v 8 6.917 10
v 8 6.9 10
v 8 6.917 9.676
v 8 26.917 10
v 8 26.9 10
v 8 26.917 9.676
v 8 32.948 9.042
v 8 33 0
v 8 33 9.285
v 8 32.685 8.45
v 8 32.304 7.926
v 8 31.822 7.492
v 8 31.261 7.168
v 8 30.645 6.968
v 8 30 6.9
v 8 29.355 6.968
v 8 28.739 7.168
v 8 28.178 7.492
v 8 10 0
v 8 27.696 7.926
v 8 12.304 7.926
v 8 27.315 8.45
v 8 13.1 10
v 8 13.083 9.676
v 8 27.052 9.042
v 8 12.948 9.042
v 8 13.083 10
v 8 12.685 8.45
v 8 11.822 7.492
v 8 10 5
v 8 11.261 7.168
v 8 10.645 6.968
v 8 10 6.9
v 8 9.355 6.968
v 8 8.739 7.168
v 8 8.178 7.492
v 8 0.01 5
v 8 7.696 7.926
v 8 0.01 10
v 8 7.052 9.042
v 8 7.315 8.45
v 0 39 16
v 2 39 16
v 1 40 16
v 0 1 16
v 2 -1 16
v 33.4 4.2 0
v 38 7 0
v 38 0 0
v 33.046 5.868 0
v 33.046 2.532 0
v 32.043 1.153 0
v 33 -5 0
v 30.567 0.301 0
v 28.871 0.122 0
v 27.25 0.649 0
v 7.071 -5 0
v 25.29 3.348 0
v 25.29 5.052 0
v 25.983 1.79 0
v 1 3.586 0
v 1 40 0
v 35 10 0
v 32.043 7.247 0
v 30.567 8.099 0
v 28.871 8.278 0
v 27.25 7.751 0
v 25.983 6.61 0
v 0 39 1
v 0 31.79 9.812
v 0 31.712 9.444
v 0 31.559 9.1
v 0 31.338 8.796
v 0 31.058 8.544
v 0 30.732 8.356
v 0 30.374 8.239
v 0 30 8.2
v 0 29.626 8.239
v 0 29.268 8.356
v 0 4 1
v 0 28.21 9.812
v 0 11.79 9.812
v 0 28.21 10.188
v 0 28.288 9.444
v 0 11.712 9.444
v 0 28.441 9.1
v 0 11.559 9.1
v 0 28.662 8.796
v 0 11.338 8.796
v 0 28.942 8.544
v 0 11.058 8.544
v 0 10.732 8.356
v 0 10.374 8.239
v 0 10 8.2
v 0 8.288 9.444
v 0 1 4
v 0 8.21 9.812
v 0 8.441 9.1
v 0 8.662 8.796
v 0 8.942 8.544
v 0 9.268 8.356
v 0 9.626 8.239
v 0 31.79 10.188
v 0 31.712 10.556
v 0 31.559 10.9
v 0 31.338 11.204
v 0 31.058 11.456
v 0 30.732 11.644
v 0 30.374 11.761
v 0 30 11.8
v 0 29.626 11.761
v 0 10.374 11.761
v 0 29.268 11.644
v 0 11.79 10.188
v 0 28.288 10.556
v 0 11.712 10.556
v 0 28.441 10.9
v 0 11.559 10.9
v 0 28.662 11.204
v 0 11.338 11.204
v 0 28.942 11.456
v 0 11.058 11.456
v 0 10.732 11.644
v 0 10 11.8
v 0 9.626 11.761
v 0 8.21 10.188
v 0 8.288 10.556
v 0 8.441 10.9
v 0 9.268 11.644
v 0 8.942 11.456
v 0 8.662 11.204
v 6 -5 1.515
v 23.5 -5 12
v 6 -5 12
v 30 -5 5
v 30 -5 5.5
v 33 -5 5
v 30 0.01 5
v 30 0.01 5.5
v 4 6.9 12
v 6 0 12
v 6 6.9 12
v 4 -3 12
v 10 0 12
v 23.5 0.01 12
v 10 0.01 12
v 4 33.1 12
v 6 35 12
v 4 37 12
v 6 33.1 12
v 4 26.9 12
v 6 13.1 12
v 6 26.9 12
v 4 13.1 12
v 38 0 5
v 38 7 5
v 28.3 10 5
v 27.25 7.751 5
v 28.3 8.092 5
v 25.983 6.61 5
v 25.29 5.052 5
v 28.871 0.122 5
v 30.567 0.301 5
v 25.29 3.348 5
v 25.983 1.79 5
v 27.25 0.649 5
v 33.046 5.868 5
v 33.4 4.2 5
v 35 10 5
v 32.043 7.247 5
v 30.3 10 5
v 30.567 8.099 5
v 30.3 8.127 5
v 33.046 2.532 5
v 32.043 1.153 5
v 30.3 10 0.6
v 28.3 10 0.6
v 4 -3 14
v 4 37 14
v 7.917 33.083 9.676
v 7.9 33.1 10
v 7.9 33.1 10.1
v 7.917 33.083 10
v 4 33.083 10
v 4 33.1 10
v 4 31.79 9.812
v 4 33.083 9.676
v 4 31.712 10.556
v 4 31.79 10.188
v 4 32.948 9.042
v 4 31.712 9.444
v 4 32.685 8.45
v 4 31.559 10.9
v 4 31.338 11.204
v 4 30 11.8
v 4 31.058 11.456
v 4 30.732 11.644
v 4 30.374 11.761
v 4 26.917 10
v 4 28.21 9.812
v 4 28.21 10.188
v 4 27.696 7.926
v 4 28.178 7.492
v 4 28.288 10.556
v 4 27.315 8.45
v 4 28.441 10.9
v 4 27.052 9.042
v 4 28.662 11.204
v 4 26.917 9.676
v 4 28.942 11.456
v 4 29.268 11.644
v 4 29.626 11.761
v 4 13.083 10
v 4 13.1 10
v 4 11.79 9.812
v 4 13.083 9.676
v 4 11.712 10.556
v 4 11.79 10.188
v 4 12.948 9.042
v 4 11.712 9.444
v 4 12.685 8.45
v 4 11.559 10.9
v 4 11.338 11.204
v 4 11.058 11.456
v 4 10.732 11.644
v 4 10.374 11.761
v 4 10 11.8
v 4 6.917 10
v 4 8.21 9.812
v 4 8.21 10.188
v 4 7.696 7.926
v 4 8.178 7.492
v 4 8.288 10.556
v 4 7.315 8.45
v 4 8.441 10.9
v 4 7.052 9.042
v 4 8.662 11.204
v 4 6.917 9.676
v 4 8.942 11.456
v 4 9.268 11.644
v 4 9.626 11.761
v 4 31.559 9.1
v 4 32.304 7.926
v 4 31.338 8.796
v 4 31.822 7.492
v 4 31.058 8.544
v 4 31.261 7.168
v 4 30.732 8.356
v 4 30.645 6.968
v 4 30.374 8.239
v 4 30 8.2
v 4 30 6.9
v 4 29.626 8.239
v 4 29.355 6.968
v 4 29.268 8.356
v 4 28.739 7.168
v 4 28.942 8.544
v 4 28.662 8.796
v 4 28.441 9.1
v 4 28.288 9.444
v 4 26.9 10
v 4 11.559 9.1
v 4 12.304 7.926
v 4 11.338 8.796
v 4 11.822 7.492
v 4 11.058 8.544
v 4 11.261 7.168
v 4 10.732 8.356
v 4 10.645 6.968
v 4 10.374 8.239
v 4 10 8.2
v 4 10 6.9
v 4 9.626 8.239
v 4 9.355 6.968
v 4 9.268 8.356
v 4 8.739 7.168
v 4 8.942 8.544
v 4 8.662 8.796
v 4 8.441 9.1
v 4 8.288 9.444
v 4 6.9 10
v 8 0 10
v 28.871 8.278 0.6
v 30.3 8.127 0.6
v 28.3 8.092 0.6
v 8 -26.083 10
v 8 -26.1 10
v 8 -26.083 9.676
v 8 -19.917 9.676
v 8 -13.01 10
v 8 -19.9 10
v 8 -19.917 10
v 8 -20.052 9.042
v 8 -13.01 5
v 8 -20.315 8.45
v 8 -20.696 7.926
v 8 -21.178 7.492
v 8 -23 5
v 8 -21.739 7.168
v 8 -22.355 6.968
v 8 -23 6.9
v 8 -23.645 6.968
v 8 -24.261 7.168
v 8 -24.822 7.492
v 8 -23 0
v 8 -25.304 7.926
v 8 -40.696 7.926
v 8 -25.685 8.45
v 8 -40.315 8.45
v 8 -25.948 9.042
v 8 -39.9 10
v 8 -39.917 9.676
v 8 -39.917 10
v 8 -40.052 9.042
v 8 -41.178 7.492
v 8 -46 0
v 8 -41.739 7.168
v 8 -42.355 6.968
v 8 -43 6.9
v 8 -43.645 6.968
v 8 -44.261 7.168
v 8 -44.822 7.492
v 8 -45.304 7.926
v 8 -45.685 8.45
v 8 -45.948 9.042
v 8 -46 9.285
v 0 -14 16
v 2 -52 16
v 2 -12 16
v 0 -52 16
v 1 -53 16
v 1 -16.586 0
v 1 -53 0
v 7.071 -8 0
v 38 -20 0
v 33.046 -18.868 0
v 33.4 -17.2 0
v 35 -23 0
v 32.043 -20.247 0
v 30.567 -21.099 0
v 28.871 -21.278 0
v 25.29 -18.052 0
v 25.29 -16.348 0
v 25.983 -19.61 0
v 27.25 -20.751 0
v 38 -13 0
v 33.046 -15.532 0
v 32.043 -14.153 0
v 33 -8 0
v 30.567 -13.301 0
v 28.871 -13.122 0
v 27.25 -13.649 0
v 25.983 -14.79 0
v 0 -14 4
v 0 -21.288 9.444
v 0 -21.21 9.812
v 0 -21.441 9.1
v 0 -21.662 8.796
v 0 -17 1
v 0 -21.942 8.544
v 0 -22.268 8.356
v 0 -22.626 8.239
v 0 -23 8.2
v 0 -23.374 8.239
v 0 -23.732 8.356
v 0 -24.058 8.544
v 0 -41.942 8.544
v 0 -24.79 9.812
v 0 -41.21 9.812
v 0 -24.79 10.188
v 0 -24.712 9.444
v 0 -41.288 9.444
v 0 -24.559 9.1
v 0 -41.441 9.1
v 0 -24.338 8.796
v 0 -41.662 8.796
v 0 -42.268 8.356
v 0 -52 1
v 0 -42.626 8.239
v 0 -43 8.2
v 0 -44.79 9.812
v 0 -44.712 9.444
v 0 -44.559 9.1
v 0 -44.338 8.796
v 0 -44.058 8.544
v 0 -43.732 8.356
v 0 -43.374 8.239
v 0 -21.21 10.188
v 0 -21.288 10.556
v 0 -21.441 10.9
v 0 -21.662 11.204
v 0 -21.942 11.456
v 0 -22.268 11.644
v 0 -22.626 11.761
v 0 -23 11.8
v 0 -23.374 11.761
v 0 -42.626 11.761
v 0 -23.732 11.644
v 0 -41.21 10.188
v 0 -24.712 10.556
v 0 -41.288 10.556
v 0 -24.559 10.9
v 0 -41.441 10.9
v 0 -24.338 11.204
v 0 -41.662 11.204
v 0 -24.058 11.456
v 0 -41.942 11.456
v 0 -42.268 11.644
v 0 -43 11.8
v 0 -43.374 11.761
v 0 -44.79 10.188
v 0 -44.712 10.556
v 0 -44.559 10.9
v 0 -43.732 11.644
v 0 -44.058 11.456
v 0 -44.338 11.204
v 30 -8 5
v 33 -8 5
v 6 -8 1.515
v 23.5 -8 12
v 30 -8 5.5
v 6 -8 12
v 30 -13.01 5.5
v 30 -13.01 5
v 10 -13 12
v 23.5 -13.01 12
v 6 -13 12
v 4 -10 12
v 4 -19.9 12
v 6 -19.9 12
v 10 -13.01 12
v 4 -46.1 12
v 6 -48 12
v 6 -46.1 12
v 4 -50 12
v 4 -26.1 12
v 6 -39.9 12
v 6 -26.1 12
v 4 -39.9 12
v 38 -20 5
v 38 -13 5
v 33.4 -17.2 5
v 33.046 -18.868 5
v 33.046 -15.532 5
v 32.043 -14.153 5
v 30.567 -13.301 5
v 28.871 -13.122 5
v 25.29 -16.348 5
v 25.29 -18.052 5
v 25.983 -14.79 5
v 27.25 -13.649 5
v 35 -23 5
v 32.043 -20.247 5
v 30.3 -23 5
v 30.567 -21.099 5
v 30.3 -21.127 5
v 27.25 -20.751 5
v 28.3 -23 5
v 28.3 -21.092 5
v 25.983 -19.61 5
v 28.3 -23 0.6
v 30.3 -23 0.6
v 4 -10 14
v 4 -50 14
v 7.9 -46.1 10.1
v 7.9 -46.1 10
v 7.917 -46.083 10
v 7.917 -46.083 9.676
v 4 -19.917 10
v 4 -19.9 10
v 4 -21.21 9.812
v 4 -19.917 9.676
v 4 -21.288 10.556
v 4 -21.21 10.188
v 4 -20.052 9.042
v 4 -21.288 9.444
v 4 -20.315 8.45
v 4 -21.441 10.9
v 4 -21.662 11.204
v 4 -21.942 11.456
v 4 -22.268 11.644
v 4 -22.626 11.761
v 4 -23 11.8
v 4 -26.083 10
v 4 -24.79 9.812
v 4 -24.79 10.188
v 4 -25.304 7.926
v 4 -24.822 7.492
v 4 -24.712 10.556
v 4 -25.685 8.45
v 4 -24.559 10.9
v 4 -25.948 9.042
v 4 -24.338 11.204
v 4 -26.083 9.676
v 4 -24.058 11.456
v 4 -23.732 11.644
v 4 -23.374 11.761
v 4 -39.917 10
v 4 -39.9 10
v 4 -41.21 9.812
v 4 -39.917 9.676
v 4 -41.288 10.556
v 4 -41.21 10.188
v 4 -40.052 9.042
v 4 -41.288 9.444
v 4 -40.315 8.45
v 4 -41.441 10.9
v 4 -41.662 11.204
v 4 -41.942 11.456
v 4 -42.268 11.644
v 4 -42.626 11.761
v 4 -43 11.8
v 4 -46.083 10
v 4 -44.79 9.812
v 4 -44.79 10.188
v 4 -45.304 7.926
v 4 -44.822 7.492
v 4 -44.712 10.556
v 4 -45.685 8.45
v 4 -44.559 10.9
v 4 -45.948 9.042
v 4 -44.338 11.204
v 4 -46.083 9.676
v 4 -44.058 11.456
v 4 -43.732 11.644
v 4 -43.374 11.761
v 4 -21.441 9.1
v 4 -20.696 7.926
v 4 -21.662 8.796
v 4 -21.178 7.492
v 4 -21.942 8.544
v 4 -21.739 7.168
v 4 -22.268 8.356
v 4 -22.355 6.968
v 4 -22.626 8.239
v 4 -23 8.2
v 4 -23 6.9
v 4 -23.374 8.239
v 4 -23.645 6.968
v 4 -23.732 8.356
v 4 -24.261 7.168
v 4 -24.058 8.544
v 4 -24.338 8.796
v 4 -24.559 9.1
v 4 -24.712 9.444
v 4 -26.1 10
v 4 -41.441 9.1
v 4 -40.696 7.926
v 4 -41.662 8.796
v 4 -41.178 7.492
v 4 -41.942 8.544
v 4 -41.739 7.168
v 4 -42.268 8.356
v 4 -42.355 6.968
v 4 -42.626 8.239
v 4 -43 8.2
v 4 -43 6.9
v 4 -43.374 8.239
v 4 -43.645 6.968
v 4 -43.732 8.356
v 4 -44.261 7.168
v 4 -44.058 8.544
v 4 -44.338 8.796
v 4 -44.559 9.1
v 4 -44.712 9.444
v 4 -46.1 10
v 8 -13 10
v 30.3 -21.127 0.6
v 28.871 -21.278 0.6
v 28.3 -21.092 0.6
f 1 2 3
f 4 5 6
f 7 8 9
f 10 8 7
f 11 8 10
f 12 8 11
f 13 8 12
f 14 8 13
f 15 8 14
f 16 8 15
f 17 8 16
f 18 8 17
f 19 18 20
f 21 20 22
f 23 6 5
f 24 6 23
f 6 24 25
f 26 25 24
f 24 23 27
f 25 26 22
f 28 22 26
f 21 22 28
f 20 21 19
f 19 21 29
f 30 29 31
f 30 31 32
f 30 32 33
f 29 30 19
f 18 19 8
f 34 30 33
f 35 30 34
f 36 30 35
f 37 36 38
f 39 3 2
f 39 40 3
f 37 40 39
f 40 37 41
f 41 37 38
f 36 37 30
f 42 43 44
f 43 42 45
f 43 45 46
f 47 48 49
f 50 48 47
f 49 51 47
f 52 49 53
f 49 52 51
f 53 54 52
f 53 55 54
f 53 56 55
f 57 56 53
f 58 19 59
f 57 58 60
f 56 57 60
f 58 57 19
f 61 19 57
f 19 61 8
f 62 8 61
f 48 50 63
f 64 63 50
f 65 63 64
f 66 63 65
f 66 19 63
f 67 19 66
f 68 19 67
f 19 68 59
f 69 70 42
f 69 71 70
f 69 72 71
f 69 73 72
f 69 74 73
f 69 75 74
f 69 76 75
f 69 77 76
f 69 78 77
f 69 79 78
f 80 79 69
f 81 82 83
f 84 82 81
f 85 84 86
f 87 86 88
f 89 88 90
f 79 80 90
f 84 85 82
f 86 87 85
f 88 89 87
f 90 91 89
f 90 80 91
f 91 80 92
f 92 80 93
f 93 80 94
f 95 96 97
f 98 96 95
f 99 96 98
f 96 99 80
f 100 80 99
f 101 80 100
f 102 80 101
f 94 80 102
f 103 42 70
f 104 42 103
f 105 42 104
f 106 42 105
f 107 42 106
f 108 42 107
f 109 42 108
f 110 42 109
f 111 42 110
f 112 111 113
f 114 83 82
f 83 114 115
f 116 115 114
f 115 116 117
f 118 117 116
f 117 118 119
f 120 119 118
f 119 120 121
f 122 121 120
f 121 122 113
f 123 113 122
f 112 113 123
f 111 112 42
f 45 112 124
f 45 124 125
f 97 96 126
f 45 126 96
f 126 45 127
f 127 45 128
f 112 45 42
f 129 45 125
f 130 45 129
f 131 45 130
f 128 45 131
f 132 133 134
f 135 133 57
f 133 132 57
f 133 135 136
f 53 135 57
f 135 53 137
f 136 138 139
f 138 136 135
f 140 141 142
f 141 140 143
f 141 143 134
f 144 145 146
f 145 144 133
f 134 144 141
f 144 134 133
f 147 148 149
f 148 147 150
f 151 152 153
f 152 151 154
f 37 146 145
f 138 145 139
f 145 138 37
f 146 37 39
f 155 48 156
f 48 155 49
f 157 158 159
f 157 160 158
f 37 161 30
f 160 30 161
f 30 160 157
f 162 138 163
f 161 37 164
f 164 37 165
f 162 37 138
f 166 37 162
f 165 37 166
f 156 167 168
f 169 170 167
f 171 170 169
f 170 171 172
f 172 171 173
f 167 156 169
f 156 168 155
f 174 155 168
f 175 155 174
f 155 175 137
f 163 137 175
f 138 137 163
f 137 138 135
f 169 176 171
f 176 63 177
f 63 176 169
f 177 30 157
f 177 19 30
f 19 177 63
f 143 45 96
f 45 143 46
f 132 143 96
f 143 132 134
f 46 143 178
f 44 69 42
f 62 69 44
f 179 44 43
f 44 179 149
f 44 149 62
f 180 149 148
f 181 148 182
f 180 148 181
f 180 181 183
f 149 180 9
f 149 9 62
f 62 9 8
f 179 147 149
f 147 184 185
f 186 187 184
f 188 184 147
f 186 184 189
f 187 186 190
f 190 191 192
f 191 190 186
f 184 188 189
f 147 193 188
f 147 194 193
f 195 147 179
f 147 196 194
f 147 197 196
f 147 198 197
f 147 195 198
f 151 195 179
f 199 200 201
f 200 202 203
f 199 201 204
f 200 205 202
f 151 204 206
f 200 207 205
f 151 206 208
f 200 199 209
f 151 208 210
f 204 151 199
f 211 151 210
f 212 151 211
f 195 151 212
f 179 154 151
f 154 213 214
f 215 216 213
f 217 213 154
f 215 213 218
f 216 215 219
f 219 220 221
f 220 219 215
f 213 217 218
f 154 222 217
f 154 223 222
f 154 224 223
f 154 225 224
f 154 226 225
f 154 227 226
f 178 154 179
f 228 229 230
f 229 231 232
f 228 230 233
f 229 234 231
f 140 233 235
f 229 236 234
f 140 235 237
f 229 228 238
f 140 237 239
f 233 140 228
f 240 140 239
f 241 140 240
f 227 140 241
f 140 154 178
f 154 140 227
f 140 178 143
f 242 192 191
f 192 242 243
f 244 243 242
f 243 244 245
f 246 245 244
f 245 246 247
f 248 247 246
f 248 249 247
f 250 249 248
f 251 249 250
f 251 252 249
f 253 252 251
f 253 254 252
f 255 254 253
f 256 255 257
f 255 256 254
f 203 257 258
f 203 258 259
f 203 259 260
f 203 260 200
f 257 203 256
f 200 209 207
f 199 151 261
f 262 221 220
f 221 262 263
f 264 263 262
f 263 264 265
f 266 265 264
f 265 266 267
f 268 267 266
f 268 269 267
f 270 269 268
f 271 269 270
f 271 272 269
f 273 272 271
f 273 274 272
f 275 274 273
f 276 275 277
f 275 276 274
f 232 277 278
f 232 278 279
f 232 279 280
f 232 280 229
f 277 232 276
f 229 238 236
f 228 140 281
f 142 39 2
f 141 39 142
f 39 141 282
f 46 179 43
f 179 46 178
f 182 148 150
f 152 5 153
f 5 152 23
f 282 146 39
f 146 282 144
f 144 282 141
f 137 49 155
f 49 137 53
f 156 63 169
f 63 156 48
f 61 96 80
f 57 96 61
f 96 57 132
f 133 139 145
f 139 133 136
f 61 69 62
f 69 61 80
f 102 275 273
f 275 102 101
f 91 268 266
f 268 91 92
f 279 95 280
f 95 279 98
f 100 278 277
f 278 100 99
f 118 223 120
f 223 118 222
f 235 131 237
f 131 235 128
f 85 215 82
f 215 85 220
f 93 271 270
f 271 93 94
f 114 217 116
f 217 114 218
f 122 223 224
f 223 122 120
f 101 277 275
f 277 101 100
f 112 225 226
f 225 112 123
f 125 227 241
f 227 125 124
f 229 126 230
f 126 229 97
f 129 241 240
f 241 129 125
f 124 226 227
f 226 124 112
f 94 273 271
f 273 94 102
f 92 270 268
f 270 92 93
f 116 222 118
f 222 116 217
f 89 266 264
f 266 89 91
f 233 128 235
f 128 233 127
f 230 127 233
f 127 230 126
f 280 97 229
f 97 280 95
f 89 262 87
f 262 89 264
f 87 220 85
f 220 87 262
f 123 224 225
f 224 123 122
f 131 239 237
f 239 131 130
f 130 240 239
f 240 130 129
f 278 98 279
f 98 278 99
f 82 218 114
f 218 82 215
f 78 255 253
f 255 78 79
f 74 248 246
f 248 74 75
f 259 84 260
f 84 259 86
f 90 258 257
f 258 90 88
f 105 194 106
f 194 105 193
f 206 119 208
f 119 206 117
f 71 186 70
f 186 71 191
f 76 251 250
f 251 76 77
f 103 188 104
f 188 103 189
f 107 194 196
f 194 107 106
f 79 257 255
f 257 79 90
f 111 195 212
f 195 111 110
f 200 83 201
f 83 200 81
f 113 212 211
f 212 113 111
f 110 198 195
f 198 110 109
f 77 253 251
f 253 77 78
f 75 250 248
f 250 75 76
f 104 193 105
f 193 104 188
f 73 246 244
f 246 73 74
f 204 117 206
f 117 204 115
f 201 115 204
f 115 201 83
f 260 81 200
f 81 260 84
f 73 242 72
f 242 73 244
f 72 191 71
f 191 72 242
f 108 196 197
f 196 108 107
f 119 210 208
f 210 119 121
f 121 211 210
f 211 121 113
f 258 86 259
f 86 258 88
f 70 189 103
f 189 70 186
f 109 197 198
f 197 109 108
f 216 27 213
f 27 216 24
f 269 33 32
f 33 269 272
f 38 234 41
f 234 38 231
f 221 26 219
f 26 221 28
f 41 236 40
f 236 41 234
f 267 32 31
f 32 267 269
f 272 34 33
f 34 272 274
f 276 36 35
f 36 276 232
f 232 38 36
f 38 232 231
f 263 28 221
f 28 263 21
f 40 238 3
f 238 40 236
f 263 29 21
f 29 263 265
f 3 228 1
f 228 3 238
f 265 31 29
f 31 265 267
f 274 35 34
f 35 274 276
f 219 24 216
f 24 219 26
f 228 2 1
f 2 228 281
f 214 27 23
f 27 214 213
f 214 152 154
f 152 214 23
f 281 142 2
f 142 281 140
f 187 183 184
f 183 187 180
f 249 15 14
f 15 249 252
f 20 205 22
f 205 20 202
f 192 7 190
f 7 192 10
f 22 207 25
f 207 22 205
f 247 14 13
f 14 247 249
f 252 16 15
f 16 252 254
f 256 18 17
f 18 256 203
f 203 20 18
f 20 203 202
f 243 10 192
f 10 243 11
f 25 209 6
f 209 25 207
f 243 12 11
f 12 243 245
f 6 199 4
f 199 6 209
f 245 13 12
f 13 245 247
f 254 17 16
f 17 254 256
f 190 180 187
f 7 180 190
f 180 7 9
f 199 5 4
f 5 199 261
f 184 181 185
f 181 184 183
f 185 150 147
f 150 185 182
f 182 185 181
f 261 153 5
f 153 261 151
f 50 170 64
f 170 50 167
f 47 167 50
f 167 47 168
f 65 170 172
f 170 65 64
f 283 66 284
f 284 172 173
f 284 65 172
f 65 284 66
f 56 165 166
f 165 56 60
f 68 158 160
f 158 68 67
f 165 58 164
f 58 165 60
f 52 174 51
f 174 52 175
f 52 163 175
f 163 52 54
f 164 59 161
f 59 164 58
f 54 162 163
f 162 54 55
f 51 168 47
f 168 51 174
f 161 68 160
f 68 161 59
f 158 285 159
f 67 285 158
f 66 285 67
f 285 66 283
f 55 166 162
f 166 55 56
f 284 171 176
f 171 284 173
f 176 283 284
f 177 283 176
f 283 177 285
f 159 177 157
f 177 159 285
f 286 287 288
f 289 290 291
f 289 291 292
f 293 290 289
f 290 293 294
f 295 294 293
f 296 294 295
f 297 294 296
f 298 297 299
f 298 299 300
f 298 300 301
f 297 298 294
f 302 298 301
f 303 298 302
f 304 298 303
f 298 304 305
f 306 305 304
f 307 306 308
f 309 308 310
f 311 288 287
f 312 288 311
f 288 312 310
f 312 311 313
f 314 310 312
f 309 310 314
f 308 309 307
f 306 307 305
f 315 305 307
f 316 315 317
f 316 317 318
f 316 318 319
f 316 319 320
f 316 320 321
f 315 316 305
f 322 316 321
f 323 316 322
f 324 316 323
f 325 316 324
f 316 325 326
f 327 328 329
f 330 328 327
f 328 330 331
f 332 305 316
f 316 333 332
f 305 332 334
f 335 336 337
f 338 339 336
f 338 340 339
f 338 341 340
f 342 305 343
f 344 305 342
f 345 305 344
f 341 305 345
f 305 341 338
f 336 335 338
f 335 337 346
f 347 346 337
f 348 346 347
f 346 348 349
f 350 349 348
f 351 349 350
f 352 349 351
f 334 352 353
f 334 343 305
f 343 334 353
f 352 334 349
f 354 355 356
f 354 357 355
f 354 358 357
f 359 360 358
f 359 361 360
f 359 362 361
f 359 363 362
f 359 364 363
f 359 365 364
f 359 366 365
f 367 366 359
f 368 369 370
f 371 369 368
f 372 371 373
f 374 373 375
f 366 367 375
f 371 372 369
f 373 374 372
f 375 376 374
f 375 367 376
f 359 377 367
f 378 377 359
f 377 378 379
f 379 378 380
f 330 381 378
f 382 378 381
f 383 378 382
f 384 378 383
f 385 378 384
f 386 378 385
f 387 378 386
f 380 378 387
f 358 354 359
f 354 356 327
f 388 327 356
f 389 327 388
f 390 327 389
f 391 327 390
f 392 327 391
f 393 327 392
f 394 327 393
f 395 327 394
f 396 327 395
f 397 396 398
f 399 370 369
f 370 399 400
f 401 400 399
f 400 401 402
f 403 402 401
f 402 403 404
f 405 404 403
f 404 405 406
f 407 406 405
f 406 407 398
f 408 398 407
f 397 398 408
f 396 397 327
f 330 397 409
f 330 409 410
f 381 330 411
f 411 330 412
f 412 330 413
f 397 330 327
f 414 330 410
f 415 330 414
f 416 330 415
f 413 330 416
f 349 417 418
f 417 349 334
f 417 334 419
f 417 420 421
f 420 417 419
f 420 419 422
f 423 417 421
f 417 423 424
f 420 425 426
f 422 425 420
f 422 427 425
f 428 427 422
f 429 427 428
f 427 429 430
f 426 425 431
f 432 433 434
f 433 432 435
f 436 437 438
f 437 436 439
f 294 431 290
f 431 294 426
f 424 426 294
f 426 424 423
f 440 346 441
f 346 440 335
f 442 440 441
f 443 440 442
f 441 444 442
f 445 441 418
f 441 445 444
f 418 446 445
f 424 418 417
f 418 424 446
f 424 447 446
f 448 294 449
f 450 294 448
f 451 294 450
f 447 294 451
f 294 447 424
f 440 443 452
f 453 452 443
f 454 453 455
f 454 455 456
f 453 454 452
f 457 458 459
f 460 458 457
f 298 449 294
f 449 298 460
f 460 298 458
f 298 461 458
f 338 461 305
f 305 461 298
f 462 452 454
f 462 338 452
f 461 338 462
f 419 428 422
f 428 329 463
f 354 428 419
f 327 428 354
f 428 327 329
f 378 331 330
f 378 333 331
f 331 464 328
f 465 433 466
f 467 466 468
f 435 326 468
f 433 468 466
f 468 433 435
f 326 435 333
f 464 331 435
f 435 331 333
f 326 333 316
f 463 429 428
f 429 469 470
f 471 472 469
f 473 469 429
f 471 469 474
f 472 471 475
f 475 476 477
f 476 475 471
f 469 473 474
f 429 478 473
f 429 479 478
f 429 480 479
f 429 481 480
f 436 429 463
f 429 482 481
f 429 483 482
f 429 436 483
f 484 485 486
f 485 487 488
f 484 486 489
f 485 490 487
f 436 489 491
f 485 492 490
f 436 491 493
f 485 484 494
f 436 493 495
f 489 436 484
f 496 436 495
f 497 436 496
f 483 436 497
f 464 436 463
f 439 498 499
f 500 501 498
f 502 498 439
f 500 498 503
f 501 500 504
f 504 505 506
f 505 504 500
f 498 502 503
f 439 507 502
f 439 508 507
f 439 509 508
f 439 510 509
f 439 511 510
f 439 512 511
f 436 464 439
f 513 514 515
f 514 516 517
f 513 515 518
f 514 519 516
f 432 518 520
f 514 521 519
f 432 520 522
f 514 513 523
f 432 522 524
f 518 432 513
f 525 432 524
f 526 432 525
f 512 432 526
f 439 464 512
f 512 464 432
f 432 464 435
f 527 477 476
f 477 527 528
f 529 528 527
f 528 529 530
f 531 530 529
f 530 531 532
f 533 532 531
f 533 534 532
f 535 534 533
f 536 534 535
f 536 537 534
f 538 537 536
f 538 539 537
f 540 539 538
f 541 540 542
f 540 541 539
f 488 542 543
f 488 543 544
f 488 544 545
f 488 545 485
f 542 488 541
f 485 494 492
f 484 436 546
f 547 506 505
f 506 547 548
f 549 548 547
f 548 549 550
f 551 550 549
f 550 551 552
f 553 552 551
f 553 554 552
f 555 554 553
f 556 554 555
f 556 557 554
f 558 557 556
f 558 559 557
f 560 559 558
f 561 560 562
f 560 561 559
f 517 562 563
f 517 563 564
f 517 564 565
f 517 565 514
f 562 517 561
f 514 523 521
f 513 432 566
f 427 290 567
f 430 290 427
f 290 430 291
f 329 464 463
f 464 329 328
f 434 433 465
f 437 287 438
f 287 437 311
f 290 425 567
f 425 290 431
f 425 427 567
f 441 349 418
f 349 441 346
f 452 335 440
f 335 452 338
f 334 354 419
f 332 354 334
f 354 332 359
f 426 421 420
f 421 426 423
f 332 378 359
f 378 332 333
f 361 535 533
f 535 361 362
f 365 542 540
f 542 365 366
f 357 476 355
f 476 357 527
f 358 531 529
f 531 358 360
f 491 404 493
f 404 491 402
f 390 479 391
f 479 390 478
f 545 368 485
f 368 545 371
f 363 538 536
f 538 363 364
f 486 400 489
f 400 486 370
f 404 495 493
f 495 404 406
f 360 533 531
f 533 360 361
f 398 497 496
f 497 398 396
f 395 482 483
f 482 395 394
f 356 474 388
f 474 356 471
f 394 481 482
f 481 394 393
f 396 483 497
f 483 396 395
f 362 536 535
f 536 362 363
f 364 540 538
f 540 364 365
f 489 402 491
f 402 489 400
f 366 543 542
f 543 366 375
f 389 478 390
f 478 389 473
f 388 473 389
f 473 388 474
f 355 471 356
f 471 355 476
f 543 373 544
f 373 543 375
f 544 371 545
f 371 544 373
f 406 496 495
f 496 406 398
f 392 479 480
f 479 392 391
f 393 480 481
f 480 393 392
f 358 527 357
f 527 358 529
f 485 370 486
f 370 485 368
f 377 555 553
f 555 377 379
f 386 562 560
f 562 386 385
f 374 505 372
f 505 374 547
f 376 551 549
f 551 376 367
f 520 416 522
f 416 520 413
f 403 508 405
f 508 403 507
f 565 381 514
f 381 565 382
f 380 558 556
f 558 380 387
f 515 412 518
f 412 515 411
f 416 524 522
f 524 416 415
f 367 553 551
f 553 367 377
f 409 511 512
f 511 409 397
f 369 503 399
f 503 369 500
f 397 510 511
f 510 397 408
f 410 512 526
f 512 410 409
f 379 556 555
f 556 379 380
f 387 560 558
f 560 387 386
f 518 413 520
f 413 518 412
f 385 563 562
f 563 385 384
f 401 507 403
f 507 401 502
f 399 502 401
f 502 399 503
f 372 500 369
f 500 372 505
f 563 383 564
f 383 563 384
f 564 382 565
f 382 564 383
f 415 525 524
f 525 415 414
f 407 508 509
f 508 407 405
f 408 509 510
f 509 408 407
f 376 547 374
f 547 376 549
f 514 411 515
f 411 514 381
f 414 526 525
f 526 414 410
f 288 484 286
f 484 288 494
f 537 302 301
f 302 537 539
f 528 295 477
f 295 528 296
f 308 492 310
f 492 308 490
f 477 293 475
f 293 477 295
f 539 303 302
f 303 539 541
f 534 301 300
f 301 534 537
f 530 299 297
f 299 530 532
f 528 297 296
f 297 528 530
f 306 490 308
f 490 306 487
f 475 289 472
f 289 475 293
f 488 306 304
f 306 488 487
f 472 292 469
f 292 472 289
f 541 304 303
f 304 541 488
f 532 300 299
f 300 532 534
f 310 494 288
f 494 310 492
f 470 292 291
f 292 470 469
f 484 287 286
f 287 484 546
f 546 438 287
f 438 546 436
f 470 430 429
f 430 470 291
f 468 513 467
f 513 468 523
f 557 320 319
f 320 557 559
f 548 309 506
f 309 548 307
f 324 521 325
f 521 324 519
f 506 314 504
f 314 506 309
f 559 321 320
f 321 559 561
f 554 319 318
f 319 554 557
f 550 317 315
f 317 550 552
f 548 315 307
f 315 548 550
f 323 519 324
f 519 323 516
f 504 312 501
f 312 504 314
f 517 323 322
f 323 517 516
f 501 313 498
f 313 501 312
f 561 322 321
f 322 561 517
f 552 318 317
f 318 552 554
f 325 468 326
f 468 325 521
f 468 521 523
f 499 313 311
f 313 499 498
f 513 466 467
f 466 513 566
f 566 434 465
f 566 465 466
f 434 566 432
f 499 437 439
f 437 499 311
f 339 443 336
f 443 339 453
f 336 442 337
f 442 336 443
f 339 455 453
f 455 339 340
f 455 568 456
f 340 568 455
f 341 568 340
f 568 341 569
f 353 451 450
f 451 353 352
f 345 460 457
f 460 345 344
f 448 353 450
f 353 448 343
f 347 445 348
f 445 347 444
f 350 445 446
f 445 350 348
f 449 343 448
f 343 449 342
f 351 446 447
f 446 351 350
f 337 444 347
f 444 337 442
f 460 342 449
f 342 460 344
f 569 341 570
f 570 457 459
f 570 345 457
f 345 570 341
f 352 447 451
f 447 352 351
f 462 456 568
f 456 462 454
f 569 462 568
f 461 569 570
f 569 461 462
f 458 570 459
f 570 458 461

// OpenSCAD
// PRUSA iteration3
// Z axis top holder
// GNU GPL v3
// Josef Průša <iam@josefprusa.cz> and contributors
// http://www.reprap.org/wiki/Prusa_Mendel
// http://prusamendel.org

module z_top_base(){
 translate([0,-5,0]) cube([8,45,16]); // plate touching the base
 translate([0,-5,0]) cube([30,5.01,12]); // plate touching the base
 translate([0,-5,0]) cube([38,15,5]); // plate touching the base
}

module z_top_fancy(){
 // Corner cutouts
 translate([0.5,0.5,0]) rotate([0,0,-45-180]) translate([-15,0,-1]) cube([30,30,51]);
 translate([0.5,40-0.5,0]) rotate([0,0,-45+90]) translate([-15,0,-1]) cube([30,30,51]);
 translate([-4,40+5,0]) rotate([0,0,-45-0]) translate([0,0,-1]) cube([30,30,51]);
 
    translate([4,0,12]) rotate([0,0, 0]) translate([0,-5,0]) cube([30,50,30]);
    
    translate([6,0,12]) rotate([0,-45, 0]) translate([0,-5,0]) cube([30,50,30]);
    
    translate([8,5,10]) rotate([0,-45, 0]) translate([0,-5,0]) cube([30,50,30]);
 
 translate([38-2.5,-5+2.5,0]) rotate([0,0,-45-90]) translate([-15,0,-1]) cube([30,30,51]);
 translate([38-1.5,10-1.5,0]) rotate([0,0,-45]) translate([-15,0,-1]) cube([30,30,51]);
 translate([0,0,5]) rotate([45+180,0,0]) rotate([0,0,-45+90]) translate([0,0,-15]) cube([30,30,30]);

// Stiffner cut out
 translate([30,0,5.5]) rotate([0,-45,0]) translate([0,-5,0]) cube([30,50,30]);
 //easy cleanup fix
 translate([0.5,0,0.5]) rotate([0,45,0]) translate([-2.5,0,-5]) cube([5,40,5]);
}

module z_top_holes(){
 // Screw holes
 translate([-1,10,10]) rotate([0,90,0]) cylinder(h = 20, r=1.8, $fn=30);
 translate([-1,10+20,10]) rotate([0,90,0]) cylinder(h = 20, r=1.8, $fn=30);

 // Screw heads
 translate([4,10,10]) rotate([0,90,0]) cylinder(h = 20, r=3.1, $fn=30);
 translate([4,10-3.1,10]) cube([10,6.2,10]);
 translate([4,10+20,10]) rotate([0,90,0]) cylinder(h = 20, r=3.1, $fn=30);
 translate([4,10+20-3.1,10]) cube([10,6.2,10]);

 // Z rod holder
 translate([25+4.3,4.2,-1]) rotate([0,0,0]) cylinder(h = 50, r=4.1, $fn=15);
 translate([25+4.3-1,3,0.6]) cube([2,10,7]); // it's bit up because it helps with printing
}

// Final part
module z_top(){
 difference(){
  z_top_base();
  z_top_fancy();
  z_top_holes();
 }
 translate([0,-13,0]) mirror([0,1,0]) difference(){
  z_top_base();
  z_top_fancy();
  z_top_holes();
 }
}

z_top();
